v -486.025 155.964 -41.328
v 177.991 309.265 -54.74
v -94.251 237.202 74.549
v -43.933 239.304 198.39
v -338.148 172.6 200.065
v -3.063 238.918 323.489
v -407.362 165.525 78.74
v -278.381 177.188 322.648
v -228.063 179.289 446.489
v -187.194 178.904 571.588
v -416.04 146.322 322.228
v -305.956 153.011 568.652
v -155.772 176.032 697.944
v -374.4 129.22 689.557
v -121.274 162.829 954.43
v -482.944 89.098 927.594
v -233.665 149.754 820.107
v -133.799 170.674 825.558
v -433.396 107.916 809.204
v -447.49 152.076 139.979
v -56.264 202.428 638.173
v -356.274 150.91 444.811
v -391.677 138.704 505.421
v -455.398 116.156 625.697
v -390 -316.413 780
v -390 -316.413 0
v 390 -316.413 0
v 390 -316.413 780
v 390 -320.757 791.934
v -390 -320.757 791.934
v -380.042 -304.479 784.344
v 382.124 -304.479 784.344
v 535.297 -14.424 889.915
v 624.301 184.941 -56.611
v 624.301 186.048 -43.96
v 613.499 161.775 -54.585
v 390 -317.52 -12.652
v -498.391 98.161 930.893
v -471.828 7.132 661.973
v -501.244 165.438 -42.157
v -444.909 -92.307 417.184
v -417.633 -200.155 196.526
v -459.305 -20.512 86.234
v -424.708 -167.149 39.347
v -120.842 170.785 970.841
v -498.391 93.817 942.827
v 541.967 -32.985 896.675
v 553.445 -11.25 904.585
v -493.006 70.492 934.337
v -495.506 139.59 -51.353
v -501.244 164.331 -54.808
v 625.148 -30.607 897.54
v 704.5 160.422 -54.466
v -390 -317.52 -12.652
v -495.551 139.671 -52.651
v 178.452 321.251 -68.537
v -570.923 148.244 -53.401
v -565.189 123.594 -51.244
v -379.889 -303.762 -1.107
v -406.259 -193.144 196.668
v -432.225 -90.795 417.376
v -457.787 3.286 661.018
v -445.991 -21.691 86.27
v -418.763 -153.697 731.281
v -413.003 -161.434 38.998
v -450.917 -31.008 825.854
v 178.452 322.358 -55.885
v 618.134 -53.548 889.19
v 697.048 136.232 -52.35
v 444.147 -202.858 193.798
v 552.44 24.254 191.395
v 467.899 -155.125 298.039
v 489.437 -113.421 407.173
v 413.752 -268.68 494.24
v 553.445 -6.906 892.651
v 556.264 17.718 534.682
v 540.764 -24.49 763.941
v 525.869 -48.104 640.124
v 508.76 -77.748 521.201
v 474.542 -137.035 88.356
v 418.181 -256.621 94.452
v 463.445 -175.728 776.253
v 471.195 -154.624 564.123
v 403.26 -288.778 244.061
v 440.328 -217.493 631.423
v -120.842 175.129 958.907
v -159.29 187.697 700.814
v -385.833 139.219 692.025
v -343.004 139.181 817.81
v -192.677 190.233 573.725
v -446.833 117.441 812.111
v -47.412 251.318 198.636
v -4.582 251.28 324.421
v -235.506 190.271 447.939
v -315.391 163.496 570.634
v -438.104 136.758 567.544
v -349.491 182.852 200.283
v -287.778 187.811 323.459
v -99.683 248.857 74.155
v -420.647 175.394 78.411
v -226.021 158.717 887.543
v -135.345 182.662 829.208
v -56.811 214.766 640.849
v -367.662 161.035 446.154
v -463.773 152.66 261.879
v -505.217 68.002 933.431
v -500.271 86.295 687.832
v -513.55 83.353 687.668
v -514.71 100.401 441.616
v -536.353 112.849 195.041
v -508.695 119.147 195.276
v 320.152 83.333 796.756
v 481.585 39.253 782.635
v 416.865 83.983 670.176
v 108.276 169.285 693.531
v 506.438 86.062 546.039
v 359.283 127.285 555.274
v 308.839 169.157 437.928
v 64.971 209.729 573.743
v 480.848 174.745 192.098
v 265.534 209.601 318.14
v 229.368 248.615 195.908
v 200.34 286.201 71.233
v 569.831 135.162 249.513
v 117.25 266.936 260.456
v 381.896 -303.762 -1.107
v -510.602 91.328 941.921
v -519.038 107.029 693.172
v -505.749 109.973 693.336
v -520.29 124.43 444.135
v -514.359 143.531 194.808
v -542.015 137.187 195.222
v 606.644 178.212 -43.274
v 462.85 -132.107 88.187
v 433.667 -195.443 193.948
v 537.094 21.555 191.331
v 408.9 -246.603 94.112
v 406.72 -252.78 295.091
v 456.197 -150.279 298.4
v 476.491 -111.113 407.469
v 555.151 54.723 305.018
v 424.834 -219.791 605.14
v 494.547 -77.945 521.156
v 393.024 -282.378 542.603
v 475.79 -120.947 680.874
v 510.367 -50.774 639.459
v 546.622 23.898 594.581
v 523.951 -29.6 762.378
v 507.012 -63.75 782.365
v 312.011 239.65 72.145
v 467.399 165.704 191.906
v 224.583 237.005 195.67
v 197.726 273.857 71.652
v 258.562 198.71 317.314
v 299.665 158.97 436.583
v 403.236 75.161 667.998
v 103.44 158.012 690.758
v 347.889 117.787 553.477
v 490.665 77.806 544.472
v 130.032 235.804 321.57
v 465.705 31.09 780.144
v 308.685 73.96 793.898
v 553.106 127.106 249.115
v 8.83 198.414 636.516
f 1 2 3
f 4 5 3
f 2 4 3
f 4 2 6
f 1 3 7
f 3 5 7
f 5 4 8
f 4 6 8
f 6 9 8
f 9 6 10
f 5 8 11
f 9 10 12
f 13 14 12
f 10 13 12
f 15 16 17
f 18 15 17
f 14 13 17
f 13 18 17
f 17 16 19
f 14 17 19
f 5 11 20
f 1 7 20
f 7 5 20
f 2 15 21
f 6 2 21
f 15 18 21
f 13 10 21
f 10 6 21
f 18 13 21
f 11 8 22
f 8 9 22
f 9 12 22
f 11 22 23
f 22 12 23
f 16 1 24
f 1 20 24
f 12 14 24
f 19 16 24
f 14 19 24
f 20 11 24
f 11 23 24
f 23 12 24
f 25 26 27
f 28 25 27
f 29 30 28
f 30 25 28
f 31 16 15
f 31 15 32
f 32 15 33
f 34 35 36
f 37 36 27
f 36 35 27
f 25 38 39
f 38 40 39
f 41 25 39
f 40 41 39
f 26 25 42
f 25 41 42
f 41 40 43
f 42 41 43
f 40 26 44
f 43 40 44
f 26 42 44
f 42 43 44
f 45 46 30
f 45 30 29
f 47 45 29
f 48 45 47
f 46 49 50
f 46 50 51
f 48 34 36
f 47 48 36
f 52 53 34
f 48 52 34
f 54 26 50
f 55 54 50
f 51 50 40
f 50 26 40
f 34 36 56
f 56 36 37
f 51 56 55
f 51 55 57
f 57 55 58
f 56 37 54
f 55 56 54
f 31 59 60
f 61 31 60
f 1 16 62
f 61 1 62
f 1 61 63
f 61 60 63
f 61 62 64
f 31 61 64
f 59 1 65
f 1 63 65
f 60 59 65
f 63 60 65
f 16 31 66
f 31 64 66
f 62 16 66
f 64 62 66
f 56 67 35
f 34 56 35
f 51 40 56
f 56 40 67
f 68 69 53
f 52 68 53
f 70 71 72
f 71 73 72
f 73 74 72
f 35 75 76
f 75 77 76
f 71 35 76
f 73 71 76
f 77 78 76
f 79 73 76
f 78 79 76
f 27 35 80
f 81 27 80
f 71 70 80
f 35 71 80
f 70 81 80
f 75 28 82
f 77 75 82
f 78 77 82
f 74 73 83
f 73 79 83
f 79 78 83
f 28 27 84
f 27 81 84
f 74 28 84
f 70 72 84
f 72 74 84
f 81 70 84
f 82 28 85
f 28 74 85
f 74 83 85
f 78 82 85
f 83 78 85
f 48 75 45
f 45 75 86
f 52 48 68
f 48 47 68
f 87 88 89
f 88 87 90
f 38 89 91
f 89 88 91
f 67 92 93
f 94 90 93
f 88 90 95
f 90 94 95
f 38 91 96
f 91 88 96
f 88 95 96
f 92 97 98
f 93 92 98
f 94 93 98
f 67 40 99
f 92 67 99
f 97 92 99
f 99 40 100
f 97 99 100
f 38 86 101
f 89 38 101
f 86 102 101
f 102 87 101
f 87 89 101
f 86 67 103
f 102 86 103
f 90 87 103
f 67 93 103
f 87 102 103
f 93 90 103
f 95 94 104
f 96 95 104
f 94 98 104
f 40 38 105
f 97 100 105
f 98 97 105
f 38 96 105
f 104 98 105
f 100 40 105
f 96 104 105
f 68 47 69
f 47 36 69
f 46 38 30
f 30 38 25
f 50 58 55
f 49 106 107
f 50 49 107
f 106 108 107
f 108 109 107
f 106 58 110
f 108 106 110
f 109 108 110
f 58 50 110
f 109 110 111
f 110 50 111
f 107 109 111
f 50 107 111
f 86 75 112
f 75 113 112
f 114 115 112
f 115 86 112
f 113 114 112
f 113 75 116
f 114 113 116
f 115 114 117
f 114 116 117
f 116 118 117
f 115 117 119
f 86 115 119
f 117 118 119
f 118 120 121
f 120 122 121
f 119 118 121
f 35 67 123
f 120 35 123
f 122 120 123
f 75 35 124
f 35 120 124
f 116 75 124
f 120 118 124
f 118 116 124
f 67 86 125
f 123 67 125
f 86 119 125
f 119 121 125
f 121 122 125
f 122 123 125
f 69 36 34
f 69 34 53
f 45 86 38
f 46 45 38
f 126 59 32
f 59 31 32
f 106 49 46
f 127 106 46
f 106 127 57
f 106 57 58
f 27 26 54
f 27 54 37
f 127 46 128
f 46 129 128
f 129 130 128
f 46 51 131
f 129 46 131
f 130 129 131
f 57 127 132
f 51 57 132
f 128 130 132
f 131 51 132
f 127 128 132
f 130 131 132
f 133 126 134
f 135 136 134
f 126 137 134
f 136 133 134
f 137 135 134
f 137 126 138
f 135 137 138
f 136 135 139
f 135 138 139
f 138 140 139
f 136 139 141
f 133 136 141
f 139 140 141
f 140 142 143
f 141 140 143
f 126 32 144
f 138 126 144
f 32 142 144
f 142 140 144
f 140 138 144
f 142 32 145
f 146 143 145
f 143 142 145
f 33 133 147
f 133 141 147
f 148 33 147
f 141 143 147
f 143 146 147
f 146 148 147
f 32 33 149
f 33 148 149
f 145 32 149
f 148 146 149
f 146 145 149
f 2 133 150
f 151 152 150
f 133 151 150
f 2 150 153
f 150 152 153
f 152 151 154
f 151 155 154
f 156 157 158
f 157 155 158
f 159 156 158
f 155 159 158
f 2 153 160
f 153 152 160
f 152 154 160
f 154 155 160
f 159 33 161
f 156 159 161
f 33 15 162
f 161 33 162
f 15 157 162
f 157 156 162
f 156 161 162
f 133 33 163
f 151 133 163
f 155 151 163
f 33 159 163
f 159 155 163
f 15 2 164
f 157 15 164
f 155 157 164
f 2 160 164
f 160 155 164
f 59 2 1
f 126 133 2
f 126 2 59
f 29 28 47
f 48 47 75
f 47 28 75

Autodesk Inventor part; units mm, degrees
ref_plane "YZ Plane" through (0, 0, 0) normal (1, 0, 0) x (0, 1, 0)
sketch "Sketch1" plane through (0, 0, 0) normal (0, 0, 1) x (1, 0, 0)
  line L0 (-390, -316.4133) -> (390, -316.4133)
  line L1 (390, -316.4133) -> (624.3014, 186.0477)
  line L2 (624.3014, 186.0477) -> (178.4515, 322.3577)
  line L3 (178.4515, 322.3577) -> (-501.2441, 165.4377)
  line L4 (-501.2441, 165.4377) -> (-390, -316.4133)
  point P0 (0, 0)
  point P1 (0, -316.4133)
  dimension "d4" = 780
  dimension "d5" = 103
  dimension "d6" = 150
  dimension "d7" = 82
  dimension "d8" = 115
  dimension "d9" = 90
ref_plane "Work Plane1" through (0, 0, 780) normal (0, 0, 1) x (1, 0, 0)
sketch "Sketch2" plane through (0, 0, 780) normal (0, 0, 1) x (1, 0, 0)
  line L0 (-390, -316.4133) -> (390, -316.4133) projected
  line L1 (-390, -316.4133) -> (-498.3914, 153.0812)
  line L2 (-498.3914, 153.0812) -> (-120.8416, 240.2454)
  line L3 (-120.8416, 240.2454) -> (553.4449, 34.0954)
  line L4 (553.4449, 34.0954) -> (390, -316.4133)
  point P0 (0, 0)
  dimension "d14" = 82
  dimension "d57" = 103
  dimension "d58" = 115
ref_plane "Work Plane2" through (-390, -316.4133, 0) normal (0, 0.0871557, 0.9961947) x (1, 0, 0)
sketch "Sketch6" plane through (-390, -316.4133, 0) normal (0, 0.0871557, 0.9961947) x (1, 0, 0)
  line L0 (568.4515, 641.2111) -> (1014.3014, 504.3804) projected
  line L1 (-111.2441, 483.6916) -> (568.4515, 641.2111) projected
  line L2 (0, 0) -> (-111.2441, 483.6916) projected
  line L3 (0, 0) -> (780, 0) projected
  line L4 (1014.3014, 504.3804) -> (780, 0) projected
  point P0 (390, 315.2093)
extrude "Extrusion2" add sketch "Sketch6" against normal blind 12.7
ref_plane "Work Plane3" through (-390, -316.4133, 780) normal (0, -0.3420201, 0.9396926) x (1, 0, 0)
sketch "Sketch7" plane through (-390, -316.4133, 780) normal (0, -0.3420201, 0.9396926) x (1, 0, 0)
  line L0 (-108.3914, 441.1806) -> (269.1584, 523.0881) projected
  line L1 (0, 0) -> (-108.3914, 441.1806) projected
  line L2 (269.1584, 523.0881) -> (943.4449, 329.3704) projected
  line L3 (943.4449, 329.3704) -> (780, 0) projected
  line L4 (-108.3914, 441.1806) -> (0, 0)
  line L5 (780, 0) -> (0, 0)
  line L6 (780, 0) -> (943.4449, 329.3704)
  line L7 (943.4449, 329.3704) -> (269.1584, 523.0881)
  line L8 (269.1584, 523.0881) -> (-108.3914, 441.1806)
  point P0 (390, 30.5555)
loft "Loft3" add profiles "Sketch7" section 2 edges at (401.3765, 254.2027, -49.9224) (-161.3963, 243.8977, -49.0209) (-445.622, -75.4878, -21.0782) (0, -316.4133, 0) (507.1507, -65.1828, -21.9798)
sketch "Sketch8" plane through (-390, -316.4133, 0) normal (0, 0.0871557, 0.9961947) x (1, 0, 0)
  line L0 (568.4515, 641.2111) -> (1014.3014, 504.3804) construction
  line L1 (1014.3014, 504.3804) -> (780, 0) construction
  line L2 (780, 0) -> (0, 0) construction
  line L3 (0, 0) -> (-111.2441, 483.6916) construction
  line L4 (-111.2441, 483.6916) -> (568.4515, 641.2111) construction
  line L5 (567.991, 628.0678) -> (996.6442, 496.5147)
  line L6 (996.6442, 496.5147) -> (771.8962, 12.7)
  line L7 (771.8962, 12.7) -> (10.1107, 12.7)
  line L8 (10.1107, 12.7) -> (-96.0254, 474.1819)
  line L9 (-96.0254, 474.1819) -> (567.991, 628.0678)
  point P0 (390, 315.2093)
  dimension "d37" = 12.7
sketch "Sketch9" plane through (-390, -316.4133, 780) normal (0, -0.3420201, 0.9396926) x (1, 0, 0)
  line L0 (-108.3914, 441.1806) -> (0, 0) construction
  line L1 (0, 0) -> (780, 0) construction
  line L2 (780, 0) -> (943.4449, 329.3704) construction
  line L3 (943.4449, 329.3704) -> (269.1584, 523.0881) construction
  line L4 (269.1584, 523.0881) -> (-108.3914, 441.1806) construction
  line L5 (268.7255, 509.9988) -> (925.2973, 321.3704)
  line L6 (925.2973, 321.3704) -> (772.1245, 12.7)
  line L7 (772.1245, 12.7) -> (9.9575, 12.7)
  line L8 (9.9575, 12.7) -> (-92.9442, 431.5363)
  line L9 (-92.9442, 431.5363) -> (268.7255, 509.9988)
  point P0 (390, 30.5555)
  dimension "d38" = 12.7
loft "Loft4" cut profiles "Sketch8", "Sketch9"
sketch "Sketch10" plane through (-390, -316.4133, 780) normal (0, -0.3420201, 0.9396926) x (1, 0, 0)
  line L0 (943.4449, 329.3704) -> (269.1584, 523.0881) projected
  line L1 (269.1584, 523.0881) -> (-108.3914, 441.1806) projected
  line L2 (-108.3914, 441.1806) -> (0, 0) projected
  line L3 (0, 0) -> (780, 0) projected
  line L4 (780, 0) -> (943.4449, 329.3704) projected
  point P0 (390, 30.5555)
extrude "Extrusion3" add sketch "Sketch10" along normal blind 12.7
sketch "Sketch11" plane through (-390, -317.5202, -12.6517) normal (0, -0.0871557, -0.9961947) x (-1, 0, 0)
  line L0 (-1014.3014, 504.3804) -> (-568.4515, 641.2111) projected
  line L1 (-1014.3014, 504.3804) -> (-1094.5, 479.7676)
  line L2 (-1094.5, 479.7676) -> (-1087.0478, 455.4854)
  line L3 (-1087.0478, 455.4854) -> (-1003.4992, 481.1263)
  line L4 (-780, 0) -> (-1014.3014, 504.3804) projected
  line L5 (-943.4449, 230.5295) -> (-1014.3014, 504.3804) projected
  line L6 (-1003.4992, 481.1263) -> (-1014.3014, 504.3804)
  point P0 (-390, 315.2093)
  dimension "d46" = 25.4
sketch "Sketch12" plane through (-390, -320.757, 791.9341) normal (0, -0.3420201, 0.9396926) x (1, 0, 0)
  line L0 (943.4449, 329.3704) -> (1014.3014, 190.3481) projected
  line L1 (943.4449, 329.3704) -> (1015.1476, 308.7708)
  line L2 (943.4449, 329.3704) -> (269.1584, 523.0881) projected
  line L3 (1015.1476, 308.7708) -> (1008.134, 284.3583)
  line L4 (1008.134, 284.3583) -> (931.967, 306.2405)
  line L5 (780, 0) -> (943.4449, 329.3704) projected
  line L6 (931.967, 306.2405) -> (943.4449, 329.3704)
  point P0 (390, 30.5555)
  dimension "d45" = 25.4
loft "Loft5" add profiles "Sketch12", "Sketch11"
sketch "Sketch13" plane through (-390, -320.757, 791.9341) normal (0, -0.3420201, 0.9396926) x (1, 0, 0)
  line L0 (269.1584, 523.0881) -> (-108.3914, 441.1806) projected
  line L1 (-108.3914, 441.1806) -> (-120.6022, 438.5315)
  line L2 (-120.6022, 438.5315) -> (-115.217, 413.7089)
  line L3 (-115.217, 413.7089) -> (-103.0062, 416.358)
  line L4 (-108.3914, 441.1806) -> (0, 0) projected
  line L5 (-103.0062, 416.358) -> (-108.3914, 441.1806)
  point P0 (390, 30.5555)
  dimension "d51" = 25.4
sketch "Sketch14" plane through (-390, -317.5202, -12.6517) normal (0, -0.0871557, -0.9961947) x (-1, 0, 0)
  line L0 (-568.4515, 641.2111) -> (111.2441, 483.6916) projected
  line L1 (111.2441, 483.6916) -> (180.9234, 467.5434)
  line L2 (180.9234, 467.5434) -> (175.1889, 442.7992)
  line L3 (175.1889, 442.7992) -> (105.5096, 458.9474)
  line L4 (108.3914, 331.8639) -> (111.2441, 483.6916) projected
  line L5 (105.5096, 458.9474) -> (111.2441, 483.6916)
  point P0 (-390, 315.2093)
  dimension "d52" = 25.4
loft "Loft6" add profiles "Sketch13", "Sketch14"
properties part number "fuckeduphouse"
